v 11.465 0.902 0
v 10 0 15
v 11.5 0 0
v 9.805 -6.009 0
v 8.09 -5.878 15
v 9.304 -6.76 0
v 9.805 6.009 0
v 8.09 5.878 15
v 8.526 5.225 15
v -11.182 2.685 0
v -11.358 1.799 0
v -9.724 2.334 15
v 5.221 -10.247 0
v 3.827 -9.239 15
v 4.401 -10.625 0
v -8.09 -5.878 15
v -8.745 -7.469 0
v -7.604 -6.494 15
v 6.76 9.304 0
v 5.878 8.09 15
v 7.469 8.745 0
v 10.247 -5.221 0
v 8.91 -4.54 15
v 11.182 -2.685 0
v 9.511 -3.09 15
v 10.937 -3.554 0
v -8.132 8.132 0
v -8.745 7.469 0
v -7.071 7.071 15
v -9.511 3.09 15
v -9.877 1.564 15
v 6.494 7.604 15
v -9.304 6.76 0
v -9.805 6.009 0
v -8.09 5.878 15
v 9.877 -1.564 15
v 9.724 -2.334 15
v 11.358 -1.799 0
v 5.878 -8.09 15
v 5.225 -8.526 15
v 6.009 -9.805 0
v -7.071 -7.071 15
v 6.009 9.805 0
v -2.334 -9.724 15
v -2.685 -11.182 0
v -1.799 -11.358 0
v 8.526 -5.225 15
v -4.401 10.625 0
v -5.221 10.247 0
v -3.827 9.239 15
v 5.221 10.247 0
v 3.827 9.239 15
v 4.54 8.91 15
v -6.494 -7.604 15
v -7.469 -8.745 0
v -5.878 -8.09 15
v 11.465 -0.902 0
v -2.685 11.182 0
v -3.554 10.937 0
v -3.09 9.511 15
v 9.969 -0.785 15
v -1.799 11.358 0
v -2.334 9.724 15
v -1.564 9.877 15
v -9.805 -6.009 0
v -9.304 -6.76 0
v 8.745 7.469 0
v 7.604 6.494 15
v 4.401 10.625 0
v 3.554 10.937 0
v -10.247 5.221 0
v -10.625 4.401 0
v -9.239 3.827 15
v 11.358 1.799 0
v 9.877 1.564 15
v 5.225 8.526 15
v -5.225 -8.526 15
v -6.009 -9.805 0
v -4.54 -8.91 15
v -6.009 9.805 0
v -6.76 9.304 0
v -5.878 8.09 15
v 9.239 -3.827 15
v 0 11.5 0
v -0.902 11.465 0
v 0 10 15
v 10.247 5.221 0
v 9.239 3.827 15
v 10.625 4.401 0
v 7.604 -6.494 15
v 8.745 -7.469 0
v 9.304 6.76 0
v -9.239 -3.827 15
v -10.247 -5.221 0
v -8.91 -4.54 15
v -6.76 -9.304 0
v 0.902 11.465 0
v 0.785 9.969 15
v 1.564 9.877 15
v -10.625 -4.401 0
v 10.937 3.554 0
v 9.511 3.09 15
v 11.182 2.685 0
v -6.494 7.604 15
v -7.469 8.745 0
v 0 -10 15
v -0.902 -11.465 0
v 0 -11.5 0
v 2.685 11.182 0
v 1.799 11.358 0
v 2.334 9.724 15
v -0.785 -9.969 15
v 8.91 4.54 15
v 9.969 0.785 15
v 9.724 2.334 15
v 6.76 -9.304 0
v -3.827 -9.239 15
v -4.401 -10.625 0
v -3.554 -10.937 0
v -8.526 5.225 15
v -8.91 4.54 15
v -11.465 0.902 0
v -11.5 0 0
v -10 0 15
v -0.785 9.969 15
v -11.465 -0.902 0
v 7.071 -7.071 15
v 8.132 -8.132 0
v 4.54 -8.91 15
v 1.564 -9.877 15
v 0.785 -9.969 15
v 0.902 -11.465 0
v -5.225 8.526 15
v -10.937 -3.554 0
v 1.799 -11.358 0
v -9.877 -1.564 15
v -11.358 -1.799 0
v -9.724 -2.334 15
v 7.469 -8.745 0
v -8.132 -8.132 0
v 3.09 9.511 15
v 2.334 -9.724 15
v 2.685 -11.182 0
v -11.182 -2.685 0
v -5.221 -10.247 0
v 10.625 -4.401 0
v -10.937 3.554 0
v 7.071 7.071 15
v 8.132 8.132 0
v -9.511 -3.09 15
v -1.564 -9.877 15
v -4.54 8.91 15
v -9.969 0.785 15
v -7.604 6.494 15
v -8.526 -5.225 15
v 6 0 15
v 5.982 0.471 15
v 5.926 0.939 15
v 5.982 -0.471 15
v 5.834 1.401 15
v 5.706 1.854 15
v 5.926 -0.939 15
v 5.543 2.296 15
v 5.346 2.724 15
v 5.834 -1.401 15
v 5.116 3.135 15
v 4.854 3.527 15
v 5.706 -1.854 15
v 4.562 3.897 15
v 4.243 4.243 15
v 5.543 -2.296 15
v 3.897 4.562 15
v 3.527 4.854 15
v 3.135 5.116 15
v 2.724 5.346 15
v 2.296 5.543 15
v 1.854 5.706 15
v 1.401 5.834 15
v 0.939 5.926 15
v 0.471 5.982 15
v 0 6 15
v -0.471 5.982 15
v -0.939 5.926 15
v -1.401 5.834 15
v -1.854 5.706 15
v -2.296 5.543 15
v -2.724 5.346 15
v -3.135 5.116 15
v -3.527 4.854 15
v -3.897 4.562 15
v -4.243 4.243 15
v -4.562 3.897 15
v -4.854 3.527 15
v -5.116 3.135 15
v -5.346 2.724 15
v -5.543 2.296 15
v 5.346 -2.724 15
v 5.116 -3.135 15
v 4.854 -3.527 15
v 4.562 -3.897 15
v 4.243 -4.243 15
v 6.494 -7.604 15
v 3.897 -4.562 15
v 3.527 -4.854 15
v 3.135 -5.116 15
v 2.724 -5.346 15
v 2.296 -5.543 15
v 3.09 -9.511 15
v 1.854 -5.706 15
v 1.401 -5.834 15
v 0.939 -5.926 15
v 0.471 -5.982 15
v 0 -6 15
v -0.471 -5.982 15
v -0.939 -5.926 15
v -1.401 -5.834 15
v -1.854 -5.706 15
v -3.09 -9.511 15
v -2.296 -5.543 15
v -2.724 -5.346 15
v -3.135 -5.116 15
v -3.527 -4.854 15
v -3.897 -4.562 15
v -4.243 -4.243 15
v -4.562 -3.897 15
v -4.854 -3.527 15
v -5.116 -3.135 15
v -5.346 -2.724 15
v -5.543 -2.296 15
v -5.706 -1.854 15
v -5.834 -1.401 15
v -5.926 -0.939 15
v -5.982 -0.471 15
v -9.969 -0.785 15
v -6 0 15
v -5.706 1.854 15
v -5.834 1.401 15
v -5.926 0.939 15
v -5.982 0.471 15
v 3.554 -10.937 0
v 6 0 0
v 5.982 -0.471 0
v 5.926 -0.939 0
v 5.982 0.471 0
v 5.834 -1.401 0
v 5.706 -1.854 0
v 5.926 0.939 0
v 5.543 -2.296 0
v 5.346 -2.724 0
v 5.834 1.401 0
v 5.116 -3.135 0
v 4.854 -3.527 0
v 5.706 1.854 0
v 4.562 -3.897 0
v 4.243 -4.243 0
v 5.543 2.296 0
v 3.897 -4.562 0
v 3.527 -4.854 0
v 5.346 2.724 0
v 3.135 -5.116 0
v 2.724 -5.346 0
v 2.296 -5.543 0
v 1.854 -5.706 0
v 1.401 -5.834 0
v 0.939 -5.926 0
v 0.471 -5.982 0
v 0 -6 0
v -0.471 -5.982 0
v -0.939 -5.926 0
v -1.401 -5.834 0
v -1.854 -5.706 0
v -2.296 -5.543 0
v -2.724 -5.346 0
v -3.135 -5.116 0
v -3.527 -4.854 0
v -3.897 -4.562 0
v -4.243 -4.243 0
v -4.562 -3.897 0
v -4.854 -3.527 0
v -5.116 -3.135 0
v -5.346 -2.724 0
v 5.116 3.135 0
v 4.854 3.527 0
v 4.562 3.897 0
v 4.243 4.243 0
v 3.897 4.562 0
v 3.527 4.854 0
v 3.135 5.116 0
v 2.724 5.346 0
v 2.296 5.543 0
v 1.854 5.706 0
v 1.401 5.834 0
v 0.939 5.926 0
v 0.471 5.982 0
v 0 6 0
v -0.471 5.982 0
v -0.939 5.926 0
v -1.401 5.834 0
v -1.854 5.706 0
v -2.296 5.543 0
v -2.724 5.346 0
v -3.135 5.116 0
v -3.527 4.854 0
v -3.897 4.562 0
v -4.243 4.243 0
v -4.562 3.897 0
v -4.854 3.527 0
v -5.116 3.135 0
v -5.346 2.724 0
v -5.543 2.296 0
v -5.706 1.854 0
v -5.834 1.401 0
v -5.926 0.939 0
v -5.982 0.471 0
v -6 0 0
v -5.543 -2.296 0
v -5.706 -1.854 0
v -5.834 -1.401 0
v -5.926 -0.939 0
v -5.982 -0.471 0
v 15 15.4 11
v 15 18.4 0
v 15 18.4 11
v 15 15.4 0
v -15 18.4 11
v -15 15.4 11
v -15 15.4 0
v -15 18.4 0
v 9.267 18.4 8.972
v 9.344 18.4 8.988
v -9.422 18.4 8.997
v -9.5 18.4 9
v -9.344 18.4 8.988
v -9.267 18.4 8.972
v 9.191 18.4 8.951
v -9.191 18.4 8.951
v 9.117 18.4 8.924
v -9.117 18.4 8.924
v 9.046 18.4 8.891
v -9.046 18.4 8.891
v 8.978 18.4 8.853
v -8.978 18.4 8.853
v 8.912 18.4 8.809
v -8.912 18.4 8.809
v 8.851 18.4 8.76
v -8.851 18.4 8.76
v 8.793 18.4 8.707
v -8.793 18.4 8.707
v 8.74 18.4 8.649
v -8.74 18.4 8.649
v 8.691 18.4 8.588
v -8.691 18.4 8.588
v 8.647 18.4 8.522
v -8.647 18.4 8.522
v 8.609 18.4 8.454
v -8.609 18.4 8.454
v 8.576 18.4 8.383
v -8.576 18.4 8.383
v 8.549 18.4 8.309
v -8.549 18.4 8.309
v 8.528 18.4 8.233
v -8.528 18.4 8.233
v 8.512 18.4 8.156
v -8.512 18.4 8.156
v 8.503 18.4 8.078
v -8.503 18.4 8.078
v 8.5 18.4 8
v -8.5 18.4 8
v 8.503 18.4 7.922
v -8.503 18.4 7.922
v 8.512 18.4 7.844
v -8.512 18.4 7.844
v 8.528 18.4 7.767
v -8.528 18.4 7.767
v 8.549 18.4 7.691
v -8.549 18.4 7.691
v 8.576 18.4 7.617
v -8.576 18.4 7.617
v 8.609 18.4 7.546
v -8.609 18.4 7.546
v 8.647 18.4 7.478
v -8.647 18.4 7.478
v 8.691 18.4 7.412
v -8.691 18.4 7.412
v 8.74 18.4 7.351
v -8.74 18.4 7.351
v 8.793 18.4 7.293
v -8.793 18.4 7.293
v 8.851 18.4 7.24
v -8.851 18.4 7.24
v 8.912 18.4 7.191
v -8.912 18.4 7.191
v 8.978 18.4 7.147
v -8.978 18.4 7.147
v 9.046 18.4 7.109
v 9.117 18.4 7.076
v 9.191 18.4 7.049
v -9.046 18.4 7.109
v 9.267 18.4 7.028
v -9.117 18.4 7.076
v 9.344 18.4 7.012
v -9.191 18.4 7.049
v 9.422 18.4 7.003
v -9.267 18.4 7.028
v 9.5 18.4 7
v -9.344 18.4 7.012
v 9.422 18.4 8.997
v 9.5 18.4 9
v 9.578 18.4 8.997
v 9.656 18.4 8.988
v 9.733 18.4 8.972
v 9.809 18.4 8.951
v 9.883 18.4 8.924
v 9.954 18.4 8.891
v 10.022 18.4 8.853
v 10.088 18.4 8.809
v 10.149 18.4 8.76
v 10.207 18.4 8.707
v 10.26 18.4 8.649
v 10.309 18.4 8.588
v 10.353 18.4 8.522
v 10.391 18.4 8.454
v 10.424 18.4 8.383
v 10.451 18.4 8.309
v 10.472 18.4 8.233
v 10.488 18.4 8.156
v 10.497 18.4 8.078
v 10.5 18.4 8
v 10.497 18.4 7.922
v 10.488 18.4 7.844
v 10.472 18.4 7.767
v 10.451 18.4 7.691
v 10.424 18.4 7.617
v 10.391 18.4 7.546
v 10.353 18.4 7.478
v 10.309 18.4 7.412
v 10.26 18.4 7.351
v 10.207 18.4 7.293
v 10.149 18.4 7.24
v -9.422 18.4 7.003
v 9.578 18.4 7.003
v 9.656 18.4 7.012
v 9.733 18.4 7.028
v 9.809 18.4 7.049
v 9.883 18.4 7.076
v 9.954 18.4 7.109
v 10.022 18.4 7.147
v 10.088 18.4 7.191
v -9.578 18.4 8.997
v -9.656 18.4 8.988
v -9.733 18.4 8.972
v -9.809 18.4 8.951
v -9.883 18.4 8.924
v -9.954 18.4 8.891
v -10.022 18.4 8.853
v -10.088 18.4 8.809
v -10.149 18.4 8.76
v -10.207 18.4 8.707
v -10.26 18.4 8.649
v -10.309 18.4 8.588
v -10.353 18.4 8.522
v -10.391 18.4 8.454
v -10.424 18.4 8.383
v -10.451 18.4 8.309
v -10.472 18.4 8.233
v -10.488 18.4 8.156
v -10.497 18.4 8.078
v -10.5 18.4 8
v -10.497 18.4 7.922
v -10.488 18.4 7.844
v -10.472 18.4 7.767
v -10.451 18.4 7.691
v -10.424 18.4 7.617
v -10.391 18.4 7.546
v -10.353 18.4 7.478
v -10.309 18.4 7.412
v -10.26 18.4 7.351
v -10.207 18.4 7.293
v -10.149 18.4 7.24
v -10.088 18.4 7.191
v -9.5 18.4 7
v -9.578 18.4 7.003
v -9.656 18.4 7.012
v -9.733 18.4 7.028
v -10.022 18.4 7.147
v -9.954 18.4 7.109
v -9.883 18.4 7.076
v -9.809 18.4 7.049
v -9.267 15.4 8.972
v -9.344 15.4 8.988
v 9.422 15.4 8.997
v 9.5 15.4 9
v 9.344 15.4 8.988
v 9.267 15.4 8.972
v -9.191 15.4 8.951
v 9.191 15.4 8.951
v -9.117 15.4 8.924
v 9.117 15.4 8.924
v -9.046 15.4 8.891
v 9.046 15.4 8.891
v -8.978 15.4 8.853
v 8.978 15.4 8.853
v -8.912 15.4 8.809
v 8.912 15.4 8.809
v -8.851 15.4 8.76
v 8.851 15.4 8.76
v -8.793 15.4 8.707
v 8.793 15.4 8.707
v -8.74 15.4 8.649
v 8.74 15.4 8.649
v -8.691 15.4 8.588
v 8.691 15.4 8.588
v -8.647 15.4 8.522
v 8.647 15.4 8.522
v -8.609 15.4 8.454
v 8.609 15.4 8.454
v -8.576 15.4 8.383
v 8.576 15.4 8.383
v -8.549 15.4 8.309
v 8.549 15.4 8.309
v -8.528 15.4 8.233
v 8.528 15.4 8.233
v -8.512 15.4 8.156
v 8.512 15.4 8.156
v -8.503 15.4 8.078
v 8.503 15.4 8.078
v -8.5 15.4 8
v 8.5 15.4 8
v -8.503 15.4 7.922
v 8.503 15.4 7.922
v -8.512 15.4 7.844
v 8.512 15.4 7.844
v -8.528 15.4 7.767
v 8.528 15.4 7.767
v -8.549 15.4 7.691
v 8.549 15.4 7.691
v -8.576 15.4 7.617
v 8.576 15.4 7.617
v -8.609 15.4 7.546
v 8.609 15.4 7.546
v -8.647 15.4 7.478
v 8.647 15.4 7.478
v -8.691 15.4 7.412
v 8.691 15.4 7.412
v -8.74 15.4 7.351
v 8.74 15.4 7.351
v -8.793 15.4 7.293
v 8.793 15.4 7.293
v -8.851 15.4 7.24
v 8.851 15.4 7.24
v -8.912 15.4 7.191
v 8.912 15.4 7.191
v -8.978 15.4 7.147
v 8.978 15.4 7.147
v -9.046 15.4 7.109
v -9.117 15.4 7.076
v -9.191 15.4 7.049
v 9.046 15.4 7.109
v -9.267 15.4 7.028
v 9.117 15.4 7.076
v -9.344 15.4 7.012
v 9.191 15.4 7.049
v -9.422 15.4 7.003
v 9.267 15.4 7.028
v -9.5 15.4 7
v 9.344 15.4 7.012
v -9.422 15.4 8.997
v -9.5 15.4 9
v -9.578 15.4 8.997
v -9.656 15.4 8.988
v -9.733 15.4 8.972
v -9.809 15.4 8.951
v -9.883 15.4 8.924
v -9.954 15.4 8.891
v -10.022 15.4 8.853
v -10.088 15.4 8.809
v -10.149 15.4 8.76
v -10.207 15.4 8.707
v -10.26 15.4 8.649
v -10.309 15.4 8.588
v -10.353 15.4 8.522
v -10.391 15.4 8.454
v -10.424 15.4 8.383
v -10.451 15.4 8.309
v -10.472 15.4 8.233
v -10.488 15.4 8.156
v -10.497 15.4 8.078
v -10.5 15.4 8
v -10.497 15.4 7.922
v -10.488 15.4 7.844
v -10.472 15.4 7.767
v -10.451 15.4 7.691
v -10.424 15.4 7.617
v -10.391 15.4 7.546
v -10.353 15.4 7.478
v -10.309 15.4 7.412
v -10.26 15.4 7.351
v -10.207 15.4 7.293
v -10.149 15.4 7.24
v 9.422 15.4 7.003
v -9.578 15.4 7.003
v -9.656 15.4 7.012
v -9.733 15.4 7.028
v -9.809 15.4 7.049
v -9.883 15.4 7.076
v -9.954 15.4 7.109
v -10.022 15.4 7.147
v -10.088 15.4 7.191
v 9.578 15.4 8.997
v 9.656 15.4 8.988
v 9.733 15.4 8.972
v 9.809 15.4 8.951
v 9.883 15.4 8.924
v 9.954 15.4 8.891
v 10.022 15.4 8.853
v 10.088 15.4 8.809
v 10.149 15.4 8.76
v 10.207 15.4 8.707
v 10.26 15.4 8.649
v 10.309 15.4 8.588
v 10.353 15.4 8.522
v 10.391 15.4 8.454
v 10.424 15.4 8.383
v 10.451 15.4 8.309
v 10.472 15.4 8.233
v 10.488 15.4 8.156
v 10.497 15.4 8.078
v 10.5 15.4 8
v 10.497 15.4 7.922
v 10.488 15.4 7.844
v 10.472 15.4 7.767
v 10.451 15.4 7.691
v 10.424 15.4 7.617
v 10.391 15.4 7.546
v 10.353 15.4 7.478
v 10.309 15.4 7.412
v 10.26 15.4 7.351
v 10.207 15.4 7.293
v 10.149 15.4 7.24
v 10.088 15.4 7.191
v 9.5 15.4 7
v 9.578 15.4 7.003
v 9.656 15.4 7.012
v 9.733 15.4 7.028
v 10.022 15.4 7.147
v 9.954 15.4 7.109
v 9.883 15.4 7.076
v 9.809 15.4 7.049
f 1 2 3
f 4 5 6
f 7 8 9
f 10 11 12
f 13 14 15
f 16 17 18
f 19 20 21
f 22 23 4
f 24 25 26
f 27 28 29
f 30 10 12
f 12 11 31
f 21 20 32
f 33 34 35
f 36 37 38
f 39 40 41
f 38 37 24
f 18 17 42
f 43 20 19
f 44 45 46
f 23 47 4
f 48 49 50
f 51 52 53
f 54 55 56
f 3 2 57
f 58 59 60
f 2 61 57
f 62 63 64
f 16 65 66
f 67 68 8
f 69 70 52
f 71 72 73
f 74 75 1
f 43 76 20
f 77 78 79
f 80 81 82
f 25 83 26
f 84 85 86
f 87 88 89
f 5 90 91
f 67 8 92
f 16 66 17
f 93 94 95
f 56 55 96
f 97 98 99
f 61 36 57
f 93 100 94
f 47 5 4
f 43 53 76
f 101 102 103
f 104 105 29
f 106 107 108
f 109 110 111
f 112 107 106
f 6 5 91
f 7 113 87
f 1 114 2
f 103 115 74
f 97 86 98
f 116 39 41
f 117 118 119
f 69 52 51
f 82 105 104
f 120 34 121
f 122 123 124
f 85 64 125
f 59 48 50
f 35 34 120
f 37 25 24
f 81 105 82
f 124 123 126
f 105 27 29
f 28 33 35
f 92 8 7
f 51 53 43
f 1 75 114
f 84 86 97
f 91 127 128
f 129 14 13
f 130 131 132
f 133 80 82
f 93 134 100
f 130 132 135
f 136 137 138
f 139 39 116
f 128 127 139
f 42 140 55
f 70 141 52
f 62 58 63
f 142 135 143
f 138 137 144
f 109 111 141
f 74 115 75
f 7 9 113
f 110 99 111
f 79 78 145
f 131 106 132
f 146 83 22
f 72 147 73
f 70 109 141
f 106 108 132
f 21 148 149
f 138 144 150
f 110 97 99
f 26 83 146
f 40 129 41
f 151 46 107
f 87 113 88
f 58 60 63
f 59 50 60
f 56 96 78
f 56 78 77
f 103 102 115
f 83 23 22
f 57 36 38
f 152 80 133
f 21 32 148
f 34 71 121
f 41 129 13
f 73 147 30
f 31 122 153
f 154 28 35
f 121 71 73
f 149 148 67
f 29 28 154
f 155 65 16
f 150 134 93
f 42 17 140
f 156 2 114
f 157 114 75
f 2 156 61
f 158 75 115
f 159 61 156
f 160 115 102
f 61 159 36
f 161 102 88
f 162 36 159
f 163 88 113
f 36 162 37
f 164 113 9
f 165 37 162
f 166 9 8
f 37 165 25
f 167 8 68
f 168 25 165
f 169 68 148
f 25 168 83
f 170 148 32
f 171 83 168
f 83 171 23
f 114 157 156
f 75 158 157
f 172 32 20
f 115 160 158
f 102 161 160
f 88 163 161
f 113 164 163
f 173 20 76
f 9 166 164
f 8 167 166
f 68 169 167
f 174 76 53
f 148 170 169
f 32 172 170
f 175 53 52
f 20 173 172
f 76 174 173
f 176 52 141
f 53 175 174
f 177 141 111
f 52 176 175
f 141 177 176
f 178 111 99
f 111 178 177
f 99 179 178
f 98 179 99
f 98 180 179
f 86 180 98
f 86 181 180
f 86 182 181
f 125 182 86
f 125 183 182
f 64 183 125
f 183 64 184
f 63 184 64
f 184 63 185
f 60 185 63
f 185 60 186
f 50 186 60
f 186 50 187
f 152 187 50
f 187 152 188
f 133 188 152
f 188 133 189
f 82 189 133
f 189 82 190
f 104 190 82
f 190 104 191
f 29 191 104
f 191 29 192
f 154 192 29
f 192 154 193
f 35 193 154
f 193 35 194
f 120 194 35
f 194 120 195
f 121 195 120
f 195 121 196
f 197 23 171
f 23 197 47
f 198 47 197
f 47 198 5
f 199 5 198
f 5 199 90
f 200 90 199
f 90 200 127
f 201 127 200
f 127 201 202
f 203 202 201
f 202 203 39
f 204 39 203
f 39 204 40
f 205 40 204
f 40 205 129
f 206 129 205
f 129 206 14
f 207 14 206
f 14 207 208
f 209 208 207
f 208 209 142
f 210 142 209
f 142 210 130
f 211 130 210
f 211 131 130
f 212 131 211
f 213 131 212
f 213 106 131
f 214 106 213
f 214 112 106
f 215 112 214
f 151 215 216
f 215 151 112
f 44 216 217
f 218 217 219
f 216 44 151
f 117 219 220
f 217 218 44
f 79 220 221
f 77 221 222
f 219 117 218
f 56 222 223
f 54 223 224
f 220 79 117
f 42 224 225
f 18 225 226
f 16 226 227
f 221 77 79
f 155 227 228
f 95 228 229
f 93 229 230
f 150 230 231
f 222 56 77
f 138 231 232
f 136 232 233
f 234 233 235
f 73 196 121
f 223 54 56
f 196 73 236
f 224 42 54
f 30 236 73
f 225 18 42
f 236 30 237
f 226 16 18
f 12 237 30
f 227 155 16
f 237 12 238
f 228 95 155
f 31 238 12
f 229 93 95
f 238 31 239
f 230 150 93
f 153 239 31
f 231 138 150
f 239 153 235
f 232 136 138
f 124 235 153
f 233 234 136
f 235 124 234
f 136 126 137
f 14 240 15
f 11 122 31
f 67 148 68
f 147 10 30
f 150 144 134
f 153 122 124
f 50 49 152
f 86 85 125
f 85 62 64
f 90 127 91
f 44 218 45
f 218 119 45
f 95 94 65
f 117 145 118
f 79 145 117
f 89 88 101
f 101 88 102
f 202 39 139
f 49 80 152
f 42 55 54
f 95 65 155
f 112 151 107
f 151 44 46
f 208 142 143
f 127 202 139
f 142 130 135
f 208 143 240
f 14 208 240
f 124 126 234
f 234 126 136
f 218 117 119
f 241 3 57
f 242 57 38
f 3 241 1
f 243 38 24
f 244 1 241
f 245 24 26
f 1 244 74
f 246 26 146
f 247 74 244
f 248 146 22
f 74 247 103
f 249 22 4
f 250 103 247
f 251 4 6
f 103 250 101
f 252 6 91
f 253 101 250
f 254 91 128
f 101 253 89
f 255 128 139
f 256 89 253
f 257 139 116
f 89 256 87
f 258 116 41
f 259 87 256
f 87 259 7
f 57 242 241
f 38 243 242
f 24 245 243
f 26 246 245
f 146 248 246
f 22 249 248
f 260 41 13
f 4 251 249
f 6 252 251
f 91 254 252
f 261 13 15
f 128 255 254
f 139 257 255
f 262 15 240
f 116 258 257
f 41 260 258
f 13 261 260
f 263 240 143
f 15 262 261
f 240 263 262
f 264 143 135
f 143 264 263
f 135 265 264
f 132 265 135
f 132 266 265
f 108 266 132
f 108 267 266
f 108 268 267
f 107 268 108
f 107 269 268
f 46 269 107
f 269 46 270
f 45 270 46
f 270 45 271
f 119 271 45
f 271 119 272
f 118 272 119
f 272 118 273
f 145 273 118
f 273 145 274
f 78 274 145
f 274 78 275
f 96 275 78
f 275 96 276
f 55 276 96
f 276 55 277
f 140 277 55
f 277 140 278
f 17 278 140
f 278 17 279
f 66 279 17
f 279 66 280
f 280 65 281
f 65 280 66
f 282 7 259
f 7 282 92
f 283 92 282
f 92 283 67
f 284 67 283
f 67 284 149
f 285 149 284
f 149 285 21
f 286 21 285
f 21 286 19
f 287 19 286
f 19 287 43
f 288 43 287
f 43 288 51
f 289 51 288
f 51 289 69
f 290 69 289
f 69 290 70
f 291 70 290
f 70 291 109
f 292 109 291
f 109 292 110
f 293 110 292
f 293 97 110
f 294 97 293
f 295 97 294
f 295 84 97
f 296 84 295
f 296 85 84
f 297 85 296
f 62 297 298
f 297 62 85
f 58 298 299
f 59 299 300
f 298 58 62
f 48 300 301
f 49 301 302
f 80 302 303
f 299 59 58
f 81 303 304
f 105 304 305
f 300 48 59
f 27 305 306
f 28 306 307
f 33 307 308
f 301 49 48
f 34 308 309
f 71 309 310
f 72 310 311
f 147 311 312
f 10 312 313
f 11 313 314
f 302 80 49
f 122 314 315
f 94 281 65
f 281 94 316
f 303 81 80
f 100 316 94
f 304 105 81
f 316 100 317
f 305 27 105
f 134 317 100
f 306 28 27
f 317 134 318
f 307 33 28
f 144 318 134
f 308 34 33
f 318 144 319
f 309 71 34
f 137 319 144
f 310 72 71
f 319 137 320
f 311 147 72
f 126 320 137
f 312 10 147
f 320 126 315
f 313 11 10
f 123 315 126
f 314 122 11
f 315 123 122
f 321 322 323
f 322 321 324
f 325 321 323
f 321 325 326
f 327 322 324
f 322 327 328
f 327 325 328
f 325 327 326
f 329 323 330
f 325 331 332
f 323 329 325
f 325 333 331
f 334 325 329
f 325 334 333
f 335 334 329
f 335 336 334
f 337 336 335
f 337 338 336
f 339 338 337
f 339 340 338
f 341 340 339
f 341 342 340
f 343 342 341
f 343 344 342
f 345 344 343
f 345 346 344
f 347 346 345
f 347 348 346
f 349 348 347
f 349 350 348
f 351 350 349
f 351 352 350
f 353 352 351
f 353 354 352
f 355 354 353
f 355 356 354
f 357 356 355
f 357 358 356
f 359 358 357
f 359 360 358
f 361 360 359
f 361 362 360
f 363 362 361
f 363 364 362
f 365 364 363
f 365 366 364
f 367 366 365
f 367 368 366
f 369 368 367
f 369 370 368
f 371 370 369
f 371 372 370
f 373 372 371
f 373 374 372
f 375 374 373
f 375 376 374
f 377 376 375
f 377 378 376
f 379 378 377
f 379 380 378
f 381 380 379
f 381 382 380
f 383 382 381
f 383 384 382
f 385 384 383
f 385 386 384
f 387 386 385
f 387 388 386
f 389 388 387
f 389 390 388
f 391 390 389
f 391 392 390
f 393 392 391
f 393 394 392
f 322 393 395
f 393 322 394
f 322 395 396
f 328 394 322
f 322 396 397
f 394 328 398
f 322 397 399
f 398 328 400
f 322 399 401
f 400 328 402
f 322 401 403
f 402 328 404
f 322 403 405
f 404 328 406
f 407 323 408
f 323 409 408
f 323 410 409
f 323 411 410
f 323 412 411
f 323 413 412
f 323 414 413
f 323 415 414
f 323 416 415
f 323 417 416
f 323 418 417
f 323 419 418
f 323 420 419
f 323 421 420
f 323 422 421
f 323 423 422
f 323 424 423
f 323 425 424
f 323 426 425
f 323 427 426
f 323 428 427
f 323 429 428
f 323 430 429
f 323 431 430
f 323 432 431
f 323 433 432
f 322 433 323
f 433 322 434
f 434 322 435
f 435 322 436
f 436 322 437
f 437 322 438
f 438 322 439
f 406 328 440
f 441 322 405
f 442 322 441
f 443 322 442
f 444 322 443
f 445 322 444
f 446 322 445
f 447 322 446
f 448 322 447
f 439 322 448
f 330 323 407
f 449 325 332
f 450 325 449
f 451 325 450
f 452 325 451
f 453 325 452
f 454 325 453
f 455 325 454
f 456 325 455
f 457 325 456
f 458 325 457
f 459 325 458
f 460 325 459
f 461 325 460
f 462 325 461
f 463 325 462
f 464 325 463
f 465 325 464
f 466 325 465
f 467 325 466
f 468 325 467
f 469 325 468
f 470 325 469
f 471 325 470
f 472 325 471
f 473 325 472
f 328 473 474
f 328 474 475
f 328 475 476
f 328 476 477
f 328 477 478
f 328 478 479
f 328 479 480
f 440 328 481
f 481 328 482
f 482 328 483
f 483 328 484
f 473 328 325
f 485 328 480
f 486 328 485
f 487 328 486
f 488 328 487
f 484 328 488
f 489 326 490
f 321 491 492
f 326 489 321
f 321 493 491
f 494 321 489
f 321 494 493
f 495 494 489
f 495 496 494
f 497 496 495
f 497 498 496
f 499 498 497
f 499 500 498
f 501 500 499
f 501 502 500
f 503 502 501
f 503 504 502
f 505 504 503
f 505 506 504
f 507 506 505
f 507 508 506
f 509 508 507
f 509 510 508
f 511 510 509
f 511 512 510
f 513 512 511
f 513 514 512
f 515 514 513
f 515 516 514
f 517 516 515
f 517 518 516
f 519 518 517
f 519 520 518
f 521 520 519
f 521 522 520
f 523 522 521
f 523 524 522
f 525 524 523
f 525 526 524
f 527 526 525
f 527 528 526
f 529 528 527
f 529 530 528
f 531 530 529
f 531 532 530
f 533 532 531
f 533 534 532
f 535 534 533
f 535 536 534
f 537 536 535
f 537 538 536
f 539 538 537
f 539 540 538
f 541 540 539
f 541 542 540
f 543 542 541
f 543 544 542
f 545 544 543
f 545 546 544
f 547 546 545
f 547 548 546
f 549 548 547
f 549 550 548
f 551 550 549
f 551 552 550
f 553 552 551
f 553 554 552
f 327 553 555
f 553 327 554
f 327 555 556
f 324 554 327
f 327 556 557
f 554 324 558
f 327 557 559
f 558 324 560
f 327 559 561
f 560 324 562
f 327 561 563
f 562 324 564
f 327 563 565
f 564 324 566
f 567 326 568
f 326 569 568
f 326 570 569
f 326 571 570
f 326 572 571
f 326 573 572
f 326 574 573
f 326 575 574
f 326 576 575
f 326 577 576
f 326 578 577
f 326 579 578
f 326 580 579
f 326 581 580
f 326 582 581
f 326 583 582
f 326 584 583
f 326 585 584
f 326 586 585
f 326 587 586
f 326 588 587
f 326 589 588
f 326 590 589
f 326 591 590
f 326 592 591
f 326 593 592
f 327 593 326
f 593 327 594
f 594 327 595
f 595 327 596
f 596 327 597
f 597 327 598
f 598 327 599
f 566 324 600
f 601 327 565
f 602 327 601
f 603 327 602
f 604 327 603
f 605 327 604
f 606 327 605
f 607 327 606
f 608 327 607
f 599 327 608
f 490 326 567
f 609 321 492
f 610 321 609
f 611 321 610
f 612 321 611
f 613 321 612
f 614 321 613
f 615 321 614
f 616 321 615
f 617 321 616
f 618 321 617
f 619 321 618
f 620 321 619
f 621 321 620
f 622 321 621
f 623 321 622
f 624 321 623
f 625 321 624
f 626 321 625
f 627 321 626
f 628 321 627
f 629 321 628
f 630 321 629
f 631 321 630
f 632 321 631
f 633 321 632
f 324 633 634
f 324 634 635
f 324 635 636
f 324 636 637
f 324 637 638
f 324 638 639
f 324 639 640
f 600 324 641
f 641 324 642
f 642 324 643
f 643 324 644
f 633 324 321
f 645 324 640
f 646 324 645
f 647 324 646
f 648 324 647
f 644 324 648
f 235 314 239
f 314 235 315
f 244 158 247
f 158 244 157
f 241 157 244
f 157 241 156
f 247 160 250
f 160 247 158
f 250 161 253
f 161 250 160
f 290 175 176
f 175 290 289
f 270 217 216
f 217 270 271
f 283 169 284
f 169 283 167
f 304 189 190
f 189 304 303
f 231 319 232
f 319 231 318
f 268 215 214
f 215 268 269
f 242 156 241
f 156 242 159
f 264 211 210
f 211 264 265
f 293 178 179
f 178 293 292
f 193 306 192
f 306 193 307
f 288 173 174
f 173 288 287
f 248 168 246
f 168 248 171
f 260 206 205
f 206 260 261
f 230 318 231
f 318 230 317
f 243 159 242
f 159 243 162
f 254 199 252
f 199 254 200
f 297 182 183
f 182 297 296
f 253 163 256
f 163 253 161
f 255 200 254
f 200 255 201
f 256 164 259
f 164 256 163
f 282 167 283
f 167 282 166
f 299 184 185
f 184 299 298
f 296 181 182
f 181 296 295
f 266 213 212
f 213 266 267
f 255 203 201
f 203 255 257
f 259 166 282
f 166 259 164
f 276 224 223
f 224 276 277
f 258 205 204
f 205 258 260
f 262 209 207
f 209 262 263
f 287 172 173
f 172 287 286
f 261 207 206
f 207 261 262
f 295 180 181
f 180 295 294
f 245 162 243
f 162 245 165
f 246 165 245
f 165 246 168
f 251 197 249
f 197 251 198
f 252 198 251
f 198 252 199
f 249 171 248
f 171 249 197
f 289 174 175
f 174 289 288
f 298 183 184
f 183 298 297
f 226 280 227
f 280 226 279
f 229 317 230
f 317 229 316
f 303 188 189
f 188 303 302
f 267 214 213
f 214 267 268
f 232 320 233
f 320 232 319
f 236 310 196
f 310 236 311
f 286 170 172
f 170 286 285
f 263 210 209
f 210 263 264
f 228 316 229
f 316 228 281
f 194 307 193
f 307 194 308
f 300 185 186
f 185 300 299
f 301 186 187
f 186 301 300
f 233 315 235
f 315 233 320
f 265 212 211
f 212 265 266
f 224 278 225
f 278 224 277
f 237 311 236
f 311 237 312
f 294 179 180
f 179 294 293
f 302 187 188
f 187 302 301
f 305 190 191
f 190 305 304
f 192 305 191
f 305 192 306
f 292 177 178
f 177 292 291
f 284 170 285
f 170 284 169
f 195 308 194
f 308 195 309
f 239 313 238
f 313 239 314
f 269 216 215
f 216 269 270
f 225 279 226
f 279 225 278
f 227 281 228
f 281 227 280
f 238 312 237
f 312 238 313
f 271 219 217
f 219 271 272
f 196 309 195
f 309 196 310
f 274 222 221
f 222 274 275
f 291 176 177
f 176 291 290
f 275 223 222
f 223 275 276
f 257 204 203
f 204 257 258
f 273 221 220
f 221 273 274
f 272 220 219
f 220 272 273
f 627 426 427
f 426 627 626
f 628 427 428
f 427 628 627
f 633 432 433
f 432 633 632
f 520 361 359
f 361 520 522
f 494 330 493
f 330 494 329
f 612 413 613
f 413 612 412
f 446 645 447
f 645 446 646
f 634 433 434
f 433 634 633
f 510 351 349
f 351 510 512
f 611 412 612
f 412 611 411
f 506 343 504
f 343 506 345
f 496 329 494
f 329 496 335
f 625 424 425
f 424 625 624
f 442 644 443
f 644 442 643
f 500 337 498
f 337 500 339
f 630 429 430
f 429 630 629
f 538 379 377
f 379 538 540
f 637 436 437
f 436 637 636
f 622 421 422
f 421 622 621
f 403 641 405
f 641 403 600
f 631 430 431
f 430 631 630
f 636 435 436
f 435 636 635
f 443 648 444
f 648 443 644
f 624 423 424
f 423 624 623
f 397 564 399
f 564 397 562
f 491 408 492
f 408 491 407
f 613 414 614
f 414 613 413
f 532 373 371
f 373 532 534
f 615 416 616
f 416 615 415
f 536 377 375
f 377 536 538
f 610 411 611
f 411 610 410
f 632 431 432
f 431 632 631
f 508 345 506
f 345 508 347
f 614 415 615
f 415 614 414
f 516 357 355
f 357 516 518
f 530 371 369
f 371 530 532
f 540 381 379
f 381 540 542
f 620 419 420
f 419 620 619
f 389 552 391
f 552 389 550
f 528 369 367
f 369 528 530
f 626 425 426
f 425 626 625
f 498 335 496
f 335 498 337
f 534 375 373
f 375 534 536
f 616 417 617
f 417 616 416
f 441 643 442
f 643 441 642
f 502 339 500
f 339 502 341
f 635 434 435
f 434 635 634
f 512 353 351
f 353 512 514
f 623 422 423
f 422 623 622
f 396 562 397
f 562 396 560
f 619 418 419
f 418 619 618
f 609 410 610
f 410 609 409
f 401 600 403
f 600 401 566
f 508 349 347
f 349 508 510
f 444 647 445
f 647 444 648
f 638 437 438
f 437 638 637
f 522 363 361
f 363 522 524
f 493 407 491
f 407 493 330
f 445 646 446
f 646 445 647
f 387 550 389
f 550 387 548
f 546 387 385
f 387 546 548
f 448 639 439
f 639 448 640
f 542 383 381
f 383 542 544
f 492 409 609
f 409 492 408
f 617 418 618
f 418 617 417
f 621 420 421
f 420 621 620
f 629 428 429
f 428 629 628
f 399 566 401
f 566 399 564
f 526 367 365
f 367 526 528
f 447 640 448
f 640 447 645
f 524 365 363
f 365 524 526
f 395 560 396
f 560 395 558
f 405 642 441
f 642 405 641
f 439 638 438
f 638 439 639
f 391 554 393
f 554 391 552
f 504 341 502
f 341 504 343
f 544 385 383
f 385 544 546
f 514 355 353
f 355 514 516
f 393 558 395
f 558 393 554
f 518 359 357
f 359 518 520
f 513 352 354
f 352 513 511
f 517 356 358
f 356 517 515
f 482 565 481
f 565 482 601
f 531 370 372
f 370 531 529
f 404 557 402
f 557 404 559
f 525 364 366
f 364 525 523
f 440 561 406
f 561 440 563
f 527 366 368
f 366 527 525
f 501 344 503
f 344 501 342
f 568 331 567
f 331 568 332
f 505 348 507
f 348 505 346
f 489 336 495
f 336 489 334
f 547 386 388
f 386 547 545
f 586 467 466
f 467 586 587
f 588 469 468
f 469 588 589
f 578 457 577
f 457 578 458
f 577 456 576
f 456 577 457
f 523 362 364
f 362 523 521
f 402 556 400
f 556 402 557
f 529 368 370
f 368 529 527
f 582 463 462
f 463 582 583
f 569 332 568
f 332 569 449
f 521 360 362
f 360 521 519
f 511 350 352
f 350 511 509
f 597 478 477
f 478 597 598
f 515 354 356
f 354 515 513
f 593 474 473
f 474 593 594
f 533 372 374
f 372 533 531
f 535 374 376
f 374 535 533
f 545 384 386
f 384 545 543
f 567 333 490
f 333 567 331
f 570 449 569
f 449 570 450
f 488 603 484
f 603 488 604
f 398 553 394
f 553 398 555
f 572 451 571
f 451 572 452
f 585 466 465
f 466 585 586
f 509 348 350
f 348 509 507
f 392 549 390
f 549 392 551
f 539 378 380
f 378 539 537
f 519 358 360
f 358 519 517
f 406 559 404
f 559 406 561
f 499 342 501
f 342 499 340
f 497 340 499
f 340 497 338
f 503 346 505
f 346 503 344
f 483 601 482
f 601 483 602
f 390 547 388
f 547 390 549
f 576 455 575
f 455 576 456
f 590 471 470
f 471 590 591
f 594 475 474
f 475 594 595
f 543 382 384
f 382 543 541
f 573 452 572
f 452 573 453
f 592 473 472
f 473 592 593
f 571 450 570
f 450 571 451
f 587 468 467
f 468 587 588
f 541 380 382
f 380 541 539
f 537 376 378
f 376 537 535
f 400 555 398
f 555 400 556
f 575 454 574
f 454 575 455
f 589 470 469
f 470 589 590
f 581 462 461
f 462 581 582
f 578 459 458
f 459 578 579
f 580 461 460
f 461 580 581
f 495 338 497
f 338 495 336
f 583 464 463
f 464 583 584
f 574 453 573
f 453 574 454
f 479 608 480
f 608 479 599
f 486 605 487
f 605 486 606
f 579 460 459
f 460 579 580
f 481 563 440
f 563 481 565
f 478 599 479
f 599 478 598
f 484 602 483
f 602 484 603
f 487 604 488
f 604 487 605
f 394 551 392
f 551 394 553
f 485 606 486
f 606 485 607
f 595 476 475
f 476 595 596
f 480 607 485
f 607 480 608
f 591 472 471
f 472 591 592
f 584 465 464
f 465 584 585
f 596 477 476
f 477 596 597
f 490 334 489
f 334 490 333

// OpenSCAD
/* ========================================================================
 *
 *       Filename:  support_axe12.scad
 *
 *    Description:  eccentric support for Ø12 axes
 *                   
 *                  eccentric adjustment (rotation) for Y axe mounted on
 *                  20x20 type 5 profile
 * 
 *        Version:  1.0
 *        Created:  07 06 2016
 *       Revision:  none
 *       Compiler:  gcc
 *
 *         Author:  Sebastien Chassot (sinux), seba.ptl@sinux.net
 *
 * ========================================================================
 */


axe_dia = 12;
ext_dia = 20;
length = 15;
support_depth = 5;

resolution = 100;

support_axe12();

module support_axe12() {
    
    difference() {
        union(){
            linear_extrude(height=support_depth, scale = 0.97, $fn=resolution)
                                import("../profiles/suport_axe12-s0.dxf");
            
            cylinder(d1 = ext_dia+3, d2 = ext_dia, h = length, $fn = 80);
            
            translate([-15,15.4,0])
                cube([30,3,11]);
        }
                                
        linear_extrude(height=support_depth*3, center =true, $fn = resolution/2)
                                import("../profiles/suport_axe12-s1.dxf");        
    
        cylinder(d = axe_dia, h = length*2.5, center =true, $fn = 80);
        
        translate([9.5, 20, 8])
            rotate([90, 0, 0])
                cylinder(d = 2, h = 10, $fn=80);
        
        translate([-9.5, 20, 8])
            rotate([90, 0, 0])
                cylinder(d = 2, h = 10, $fn=80);
        
    }
}
